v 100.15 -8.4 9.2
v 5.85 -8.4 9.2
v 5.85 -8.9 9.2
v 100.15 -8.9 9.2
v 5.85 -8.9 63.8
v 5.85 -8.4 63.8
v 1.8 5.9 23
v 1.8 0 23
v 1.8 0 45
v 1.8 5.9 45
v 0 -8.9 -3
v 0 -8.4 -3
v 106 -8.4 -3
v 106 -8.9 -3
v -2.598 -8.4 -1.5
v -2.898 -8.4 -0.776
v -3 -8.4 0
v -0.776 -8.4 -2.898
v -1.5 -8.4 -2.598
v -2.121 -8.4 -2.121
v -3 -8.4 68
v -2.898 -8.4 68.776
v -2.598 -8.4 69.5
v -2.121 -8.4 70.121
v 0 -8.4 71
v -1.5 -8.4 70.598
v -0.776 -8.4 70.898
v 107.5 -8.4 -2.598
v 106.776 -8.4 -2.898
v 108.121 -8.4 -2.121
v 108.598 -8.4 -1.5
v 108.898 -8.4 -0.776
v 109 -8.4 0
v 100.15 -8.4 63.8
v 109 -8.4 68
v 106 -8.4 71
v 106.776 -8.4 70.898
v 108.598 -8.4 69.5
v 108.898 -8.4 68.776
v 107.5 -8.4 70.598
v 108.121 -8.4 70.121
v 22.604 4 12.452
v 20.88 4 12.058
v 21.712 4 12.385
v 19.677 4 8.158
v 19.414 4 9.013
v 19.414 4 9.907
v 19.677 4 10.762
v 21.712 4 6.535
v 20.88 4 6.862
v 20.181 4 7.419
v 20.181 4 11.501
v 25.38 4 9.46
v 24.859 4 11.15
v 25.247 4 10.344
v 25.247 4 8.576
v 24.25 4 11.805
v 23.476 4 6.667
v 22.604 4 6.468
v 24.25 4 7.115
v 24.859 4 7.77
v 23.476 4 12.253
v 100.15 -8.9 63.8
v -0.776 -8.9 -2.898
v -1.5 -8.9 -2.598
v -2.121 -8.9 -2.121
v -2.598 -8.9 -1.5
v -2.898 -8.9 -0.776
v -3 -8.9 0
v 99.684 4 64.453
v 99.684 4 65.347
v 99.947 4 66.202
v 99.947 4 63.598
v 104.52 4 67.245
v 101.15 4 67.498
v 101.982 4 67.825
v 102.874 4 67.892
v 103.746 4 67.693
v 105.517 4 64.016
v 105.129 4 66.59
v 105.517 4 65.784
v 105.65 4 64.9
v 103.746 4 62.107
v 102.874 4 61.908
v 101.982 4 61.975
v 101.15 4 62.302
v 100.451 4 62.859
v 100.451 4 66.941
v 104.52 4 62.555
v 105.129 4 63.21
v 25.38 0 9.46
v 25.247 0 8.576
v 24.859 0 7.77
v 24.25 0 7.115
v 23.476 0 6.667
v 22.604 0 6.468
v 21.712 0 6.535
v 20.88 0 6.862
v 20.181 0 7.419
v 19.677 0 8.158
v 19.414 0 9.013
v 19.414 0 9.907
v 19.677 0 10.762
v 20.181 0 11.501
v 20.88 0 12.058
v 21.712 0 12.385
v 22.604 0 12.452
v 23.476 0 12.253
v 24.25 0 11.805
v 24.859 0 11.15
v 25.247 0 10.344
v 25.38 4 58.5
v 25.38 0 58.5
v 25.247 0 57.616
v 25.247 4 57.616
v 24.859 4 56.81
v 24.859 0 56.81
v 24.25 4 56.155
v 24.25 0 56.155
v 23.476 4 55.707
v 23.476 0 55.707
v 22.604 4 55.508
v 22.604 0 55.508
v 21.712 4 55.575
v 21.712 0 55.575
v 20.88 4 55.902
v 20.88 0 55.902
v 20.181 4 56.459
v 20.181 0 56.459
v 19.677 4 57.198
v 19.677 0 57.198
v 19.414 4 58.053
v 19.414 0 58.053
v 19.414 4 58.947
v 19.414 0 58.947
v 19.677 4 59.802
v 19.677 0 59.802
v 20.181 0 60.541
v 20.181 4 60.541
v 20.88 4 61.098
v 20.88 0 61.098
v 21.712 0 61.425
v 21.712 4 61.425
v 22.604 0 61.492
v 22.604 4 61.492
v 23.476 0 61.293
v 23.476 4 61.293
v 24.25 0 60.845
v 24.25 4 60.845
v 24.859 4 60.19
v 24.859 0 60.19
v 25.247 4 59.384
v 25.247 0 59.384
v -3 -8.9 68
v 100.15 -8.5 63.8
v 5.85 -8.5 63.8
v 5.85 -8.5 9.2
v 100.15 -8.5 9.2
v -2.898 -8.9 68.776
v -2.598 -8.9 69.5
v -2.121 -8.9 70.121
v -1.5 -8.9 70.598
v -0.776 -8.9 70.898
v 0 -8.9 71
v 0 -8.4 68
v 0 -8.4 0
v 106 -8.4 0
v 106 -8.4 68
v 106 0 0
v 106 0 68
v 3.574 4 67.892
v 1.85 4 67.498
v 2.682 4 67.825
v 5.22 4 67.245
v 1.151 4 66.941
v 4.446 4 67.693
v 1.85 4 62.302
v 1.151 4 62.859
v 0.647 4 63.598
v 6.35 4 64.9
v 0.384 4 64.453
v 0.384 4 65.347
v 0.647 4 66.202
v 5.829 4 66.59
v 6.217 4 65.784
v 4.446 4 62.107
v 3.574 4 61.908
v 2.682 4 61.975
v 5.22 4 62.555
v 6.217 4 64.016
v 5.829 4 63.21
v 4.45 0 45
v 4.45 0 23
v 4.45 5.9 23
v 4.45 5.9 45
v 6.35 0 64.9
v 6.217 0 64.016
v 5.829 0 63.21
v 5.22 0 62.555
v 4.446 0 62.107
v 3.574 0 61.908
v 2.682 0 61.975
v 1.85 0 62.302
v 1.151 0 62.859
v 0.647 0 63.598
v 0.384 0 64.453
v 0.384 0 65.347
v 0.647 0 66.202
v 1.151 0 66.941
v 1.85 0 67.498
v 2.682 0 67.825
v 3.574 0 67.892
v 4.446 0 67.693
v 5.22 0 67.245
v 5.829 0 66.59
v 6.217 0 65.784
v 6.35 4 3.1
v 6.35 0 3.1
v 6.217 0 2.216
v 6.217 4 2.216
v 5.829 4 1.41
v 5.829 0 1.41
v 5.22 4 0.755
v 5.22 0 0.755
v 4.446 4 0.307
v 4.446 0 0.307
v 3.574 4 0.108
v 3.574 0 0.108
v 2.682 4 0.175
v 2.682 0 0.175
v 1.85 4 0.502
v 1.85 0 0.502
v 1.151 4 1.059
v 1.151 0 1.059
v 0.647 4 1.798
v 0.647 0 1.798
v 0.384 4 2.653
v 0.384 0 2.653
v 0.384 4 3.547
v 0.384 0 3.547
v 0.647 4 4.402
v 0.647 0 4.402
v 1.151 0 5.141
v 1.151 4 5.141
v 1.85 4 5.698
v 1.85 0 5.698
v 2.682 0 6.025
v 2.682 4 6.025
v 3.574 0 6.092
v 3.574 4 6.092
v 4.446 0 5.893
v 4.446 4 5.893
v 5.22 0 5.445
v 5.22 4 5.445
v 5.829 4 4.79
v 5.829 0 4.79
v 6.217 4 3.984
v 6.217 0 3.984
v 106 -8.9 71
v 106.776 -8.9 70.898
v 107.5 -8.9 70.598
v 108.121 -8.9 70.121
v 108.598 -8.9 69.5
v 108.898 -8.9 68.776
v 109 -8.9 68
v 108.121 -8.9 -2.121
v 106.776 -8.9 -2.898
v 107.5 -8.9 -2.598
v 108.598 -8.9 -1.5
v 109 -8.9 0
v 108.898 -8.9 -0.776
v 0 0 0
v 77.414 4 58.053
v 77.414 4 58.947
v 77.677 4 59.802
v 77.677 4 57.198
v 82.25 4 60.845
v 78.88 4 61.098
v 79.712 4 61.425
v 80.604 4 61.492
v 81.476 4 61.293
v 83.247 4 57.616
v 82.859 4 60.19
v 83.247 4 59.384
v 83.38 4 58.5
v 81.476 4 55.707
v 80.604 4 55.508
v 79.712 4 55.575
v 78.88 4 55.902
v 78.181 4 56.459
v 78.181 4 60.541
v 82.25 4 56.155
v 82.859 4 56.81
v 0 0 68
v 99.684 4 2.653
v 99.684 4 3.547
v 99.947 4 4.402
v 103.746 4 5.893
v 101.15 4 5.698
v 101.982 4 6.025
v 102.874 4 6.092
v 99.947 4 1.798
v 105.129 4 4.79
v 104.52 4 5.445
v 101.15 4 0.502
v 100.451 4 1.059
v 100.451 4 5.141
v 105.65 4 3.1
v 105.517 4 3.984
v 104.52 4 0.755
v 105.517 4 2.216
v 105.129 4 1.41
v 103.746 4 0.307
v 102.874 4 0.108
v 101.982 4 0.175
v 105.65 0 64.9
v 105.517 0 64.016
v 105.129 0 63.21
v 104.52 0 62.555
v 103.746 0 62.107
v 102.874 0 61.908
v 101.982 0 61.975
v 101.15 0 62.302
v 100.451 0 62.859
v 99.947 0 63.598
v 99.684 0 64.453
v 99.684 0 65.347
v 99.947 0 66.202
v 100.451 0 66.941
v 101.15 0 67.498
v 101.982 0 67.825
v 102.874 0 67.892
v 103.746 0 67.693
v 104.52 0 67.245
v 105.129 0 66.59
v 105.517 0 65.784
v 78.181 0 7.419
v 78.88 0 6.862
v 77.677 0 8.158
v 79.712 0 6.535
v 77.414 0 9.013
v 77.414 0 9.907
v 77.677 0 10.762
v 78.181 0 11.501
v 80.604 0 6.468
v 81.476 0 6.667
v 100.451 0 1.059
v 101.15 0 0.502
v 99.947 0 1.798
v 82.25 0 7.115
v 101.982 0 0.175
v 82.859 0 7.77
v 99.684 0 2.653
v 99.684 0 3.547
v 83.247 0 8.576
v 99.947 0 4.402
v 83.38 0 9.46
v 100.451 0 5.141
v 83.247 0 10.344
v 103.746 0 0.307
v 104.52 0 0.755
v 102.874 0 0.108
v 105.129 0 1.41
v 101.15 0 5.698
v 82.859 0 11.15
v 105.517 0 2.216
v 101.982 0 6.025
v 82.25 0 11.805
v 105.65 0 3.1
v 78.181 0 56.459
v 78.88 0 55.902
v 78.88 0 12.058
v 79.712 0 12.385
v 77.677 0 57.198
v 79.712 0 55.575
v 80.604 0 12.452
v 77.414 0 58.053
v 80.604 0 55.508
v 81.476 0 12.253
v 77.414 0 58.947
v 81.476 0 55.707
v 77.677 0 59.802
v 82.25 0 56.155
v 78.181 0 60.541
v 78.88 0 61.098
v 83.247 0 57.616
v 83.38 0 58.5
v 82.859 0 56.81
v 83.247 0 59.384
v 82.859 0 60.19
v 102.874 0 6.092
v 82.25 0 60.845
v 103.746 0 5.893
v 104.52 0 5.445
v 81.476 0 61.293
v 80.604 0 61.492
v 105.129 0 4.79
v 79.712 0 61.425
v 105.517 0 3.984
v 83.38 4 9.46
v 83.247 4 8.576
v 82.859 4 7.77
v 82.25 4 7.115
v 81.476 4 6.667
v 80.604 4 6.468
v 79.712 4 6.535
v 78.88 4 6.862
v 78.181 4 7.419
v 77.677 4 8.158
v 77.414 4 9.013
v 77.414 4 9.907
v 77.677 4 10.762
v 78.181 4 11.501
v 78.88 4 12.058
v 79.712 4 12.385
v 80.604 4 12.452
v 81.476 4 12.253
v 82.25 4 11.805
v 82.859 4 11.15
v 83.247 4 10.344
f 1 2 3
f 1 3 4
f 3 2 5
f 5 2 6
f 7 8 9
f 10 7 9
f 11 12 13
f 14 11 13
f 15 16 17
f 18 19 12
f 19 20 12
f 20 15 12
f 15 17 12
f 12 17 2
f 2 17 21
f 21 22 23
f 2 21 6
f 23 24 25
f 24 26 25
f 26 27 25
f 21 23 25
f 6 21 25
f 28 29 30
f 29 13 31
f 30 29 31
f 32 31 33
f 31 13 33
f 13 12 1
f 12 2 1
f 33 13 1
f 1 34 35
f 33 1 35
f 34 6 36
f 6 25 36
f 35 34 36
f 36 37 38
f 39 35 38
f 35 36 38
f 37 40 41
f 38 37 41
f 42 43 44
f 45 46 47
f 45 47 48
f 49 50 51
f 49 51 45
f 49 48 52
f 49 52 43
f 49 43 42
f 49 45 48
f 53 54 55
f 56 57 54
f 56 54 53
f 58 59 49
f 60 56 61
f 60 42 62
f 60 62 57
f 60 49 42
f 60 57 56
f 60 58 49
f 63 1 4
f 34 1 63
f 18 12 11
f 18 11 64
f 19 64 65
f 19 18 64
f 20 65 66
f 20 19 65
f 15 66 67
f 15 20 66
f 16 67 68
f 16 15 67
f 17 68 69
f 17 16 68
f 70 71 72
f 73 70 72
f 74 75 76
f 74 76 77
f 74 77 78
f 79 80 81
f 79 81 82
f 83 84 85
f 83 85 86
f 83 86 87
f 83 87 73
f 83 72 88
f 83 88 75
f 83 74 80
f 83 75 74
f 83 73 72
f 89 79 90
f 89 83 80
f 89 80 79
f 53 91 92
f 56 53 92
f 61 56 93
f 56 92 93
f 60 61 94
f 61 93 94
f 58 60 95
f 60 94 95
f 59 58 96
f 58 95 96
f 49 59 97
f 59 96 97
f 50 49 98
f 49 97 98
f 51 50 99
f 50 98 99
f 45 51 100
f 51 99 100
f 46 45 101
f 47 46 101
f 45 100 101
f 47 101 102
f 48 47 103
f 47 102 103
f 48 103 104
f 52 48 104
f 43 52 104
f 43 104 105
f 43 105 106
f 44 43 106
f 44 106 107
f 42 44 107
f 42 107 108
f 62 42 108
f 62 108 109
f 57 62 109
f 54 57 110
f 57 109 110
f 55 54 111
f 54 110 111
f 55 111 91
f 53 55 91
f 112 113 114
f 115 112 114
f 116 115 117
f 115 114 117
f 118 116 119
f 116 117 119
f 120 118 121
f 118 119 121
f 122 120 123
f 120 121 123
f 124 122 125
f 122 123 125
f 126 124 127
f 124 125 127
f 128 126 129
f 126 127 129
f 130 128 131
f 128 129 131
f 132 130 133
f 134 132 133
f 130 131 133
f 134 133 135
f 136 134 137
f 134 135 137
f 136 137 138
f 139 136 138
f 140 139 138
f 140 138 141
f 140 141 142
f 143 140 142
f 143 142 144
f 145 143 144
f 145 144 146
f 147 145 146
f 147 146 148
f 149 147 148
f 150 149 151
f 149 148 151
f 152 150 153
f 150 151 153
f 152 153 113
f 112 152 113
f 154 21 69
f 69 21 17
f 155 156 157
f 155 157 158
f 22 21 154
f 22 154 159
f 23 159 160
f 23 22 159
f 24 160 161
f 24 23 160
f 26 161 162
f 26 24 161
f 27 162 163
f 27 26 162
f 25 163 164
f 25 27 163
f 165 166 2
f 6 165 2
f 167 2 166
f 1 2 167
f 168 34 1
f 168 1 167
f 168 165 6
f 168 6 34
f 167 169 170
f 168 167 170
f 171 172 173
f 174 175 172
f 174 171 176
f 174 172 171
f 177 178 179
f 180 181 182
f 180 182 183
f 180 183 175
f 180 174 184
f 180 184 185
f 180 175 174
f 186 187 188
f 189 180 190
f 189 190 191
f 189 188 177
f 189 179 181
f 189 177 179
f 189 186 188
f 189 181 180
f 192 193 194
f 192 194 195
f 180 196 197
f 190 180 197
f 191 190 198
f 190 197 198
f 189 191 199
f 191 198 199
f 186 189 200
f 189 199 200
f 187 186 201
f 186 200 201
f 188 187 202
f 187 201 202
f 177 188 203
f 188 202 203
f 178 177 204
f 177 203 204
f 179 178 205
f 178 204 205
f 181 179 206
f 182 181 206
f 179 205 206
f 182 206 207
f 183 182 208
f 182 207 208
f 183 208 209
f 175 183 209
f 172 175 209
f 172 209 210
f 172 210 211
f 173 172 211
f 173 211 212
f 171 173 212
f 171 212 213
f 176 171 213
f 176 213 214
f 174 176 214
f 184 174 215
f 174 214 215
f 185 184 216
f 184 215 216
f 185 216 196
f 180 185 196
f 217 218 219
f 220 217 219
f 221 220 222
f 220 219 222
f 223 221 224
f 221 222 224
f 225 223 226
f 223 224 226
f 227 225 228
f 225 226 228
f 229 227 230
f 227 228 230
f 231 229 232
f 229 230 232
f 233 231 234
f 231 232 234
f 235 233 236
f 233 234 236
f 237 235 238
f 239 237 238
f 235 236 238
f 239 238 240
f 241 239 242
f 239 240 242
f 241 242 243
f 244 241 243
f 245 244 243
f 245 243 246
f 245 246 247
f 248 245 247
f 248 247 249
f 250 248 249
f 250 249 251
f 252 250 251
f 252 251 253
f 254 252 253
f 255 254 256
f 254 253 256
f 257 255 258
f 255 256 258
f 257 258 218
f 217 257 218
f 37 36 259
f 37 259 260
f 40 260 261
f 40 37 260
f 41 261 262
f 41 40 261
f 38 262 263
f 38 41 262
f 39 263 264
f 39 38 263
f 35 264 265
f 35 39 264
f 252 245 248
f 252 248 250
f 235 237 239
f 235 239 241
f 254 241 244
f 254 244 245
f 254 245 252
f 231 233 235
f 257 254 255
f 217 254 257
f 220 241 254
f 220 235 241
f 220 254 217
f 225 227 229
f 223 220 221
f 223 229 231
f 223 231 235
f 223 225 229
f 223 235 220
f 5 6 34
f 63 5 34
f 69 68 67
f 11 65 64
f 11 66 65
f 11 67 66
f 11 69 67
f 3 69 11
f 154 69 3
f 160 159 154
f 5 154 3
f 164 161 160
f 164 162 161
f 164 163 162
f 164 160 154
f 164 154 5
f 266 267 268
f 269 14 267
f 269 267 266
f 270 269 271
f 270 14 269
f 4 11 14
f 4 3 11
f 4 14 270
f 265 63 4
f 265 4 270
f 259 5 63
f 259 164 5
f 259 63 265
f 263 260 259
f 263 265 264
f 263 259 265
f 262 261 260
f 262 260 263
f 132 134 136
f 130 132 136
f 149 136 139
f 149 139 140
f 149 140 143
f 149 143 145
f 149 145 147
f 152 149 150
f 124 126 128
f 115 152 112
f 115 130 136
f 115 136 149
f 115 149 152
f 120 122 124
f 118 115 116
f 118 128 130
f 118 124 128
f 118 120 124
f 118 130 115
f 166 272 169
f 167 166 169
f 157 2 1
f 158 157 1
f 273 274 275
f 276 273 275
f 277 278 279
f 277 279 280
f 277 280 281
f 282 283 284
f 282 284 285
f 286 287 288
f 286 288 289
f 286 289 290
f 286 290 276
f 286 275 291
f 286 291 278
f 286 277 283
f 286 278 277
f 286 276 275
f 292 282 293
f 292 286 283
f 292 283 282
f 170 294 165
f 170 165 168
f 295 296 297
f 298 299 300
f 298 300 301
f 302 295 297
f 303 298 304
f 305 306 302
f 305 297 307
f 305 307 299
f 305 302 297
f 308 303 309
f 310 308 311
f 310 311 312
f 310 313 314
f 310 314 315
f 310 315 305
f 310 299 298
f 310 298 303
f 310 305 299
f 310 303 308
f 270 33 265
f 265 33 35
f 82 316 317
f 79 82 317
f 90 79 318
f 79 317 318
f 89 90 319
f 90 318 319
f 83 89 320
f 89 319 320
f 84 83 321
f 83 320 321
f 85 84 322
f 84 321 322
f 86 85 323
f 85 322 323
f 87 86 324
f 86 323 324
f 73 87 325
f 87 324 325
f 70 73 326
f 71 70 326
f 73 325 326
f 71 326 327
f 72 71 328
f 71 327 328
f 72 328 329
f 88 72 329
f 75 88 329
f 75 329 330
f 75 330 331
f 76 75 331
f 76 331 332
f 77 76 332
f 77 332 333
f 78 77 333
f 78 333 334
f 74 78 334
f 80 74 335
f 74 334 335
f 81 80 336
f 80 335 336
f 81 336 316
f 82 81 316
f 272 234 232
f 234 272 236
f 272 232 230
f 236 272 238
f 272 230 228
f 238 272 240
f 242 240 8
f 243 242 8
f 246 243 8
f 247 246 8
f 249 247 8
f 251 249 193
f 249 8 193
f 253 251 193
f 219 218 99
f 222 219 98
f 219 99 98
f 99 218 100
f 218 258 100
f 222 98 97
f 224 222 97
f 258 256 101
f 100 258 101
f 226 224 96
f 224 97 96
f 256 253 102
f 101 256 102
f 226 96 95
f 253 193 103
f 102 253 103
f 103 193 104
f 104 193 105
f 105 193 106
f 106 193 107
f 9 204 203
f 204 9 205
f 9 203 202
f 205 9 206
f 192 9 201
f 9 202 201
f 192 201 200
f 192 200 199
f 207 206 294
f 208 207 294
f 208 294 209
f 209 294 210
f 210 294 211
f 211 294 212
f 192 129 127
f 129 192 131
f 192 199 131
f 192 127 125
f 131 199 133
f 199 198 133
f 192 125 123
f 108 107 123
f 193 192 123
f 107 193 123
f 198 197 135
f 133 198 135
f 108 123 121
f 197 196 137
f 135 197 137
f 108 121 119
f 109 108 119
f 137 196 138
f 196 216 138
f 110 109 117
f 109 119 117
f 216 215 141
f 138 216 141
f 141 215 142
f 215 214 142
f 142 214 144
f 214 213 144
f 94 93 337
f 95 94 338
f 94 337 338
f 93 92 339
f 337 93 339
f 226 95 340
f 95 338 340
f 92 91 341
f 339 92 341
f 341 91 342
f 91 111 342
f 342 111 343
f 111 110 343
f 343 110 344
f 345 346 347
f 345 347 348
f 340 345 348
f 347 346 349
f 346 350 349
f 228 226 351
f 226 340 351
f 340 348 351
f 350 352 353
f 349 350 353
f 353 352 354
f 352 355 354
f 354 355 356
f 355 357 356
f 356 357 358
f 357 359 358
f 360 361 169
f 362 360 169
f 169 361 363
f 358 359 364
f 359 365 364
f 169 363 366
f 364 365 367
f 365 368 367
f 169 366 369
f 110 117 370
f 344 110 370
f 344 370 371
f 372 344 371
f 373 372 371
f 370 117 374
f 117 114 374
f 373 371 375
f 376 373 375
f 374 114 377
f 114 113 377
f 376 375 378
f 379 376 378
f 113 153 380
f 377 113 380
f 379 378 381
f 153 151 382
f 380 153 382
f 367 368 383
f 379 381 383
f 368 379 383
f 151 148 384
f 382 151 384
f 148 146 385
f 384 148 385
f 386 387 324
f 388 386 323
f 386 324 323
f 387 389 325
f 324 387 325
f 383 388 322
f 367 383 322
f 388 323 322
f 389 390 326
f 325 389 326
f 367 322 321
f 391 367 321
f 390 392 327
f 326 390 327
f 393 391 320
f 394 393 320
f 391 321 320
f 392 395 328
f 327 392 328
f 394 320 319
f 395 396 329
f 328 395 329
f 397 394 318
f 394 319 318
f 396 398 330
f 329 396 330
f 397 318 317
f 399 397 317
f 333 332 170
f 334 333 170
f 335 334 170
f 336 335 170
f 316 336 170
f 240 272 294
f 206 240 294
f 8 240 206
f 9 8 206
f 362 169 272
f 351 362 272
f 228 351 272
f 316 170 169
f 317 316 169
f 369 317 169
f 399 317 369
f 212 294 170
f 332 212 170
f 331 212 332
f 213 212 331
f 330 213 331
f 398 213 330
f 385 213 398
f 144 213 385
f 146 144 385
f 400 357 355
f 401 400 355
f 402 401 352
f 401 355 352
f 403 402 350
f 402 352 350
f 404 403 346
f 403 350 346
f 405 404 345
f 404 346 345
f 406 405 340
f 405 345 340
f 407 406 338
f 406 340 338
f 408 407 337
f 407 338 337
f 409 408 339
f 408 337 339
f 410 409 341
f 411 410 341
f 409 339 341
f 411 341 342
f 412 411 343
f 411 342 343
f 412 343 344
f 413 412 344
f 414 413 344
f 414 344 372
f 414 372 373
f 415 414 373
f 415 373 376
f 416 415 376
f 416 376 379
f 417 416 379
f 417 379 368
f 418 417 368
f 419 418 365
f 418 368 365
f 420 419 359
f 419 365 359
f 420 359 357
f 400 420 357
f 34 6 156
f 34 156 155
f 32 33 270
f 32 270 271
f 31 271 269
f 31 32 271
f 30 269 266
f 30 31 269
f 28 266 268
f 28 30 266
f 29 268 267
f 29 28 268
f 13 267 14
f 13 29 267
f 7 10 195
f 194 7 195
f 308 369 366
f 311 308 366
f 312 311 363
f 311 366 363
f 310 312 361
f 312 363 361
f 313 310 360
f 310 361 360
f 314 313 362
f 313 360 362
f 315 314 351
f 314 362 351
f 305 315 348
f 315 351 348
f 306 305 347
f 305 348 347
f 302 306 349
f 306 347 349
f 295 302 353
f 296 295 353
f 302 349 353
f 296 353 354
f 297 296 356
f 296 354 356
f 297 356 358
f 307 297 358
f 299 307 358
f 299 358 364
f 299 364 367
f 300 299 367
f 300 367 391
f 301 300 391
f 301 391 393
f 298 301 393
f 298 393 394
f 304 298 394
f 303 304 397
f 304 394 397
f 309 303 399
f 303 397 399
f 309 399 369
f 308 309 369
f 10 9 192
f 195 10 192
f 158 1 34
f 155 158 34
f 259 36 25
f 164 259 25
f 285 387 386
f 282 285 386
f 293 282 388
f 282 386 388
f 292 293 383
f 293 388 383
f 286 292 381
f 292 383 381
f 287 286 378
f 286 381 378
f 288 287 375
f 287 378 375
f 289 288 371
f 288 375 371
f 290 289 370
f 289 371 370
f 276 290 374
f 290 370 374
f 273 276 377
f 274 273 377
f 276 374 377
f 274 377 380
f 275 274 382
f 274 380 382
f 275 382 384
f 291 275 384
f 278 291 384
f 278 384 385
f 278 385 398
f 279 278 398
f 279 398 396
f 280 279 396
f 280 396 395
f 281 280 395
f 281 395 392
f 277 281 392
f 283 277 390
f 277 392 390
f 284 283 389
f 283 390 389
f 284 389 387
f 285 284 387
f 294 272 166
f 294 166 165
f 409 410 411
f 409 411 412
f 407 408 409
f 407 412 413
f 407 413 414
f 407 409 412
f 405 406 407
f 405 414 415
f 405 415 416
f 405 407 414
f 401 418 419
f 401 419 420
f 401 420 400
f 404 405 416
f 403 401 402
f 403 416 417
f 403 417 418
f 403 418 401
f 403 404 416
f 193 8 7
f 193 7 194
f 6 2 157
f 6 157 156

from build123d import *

# Parameters (mm, degrees)
SKETCH_W     = 106
SKETCH_H     = 68
PAD_DEPTH    = 8.4
SKETCH001_R  = 3
PAD001_DEPTH = 4
SKETCH002_W  = 2.65
SKETCH002_H  = 22
PAD002_DEPTH = 5.9
SKETCH003_W  = 94.3
SKETCH003_H  = 54.6
PAD003_DEPTH = 0.1
SKETCH005_W  = 94.3
SKETCH005_H  = 54.6
PAD004_DEPTH = 0.5


with BuildPart() as lcd:
    # Sketch → Pad (new body)
    with BuildSketch(Plane.XZ):
        with Locations((53, 34)):
            Rectangle(SKETCH_W, SKETCH_H)
    extrude(amount=PAD_DEPTH)

    # Sketch001 (on Face5 of Pad) → Pad001 (join)
    with BuildSketch(Plane(origin=(0, 0, 0), x_dir=(1, 0, 0), z_dir=(0, 1, 0))):
        with Locations((3.35, -64.9)):
            Circle(SKETCH001_R)
        with Locations((102.65, -64.9)):
            Circle(SKETCH001_R)
        with Locations((102.65, -3.1)):
            Circle(SKETCH001_R)
        with Locations((3.35, -3.1)):
            Circle(SKETCH001_R)
        with Locations((80.38, -9.46)):
            Circle(SKETCH001_R)
        with Locations((80.38, -58.5)):
            Circle(SKETCH001_R)
        with Locations((22.38, -9.46)):
            Circle(SKETCH001_R)
        with Locations((22.38, -58.5)):
            Circle(SKETCH001_R)
    extrude(amount=PAD001_DEPTH)

    # Sketch002 → Pad002 (join)
    with BuildSketch(Plane.XZ):
        with Locations((3.125, 34)):
            Rectangle(SKETCH002_W, SKETCH002_H)
    extrude(amount=-PAD002_DEPTH)

    # Sketch003 (on Face5 of Pad002) → Pad003 (join)
    with BuildSketch(Plane.XZ.offset(8.4)):
        with Locations((53, 36.5)):
            Rectangle(SKETCH003_W, SKETCH003_H)
    extrude(amount=PAD003_DEPTH)


with BuildPart() as body:
    # Sketch005 (on Face1 of CopyBinder) → Pad004 (new body)
    with BuildSketch(Plane.XZ.offset(8.4)):
        with BuildLine():
            Line((-3, 68), (-3, 0))
            ThreePointArc((0, -3), (-2.12132, -2.12132), (-3, 0))
            Line((0, -3), (106, -3))
            ThreePointArc((109, 0), (108.12132, -2.12132), (106, -3))
            Line((109, 0), (109, 68))
            ThreePointArc((106, 71), (108.12132, 70.12132), (109, 68))
            Line((106, 71), (0, 71))
            ThreePointArc((-3, 68), (-2.12132, 70.12132), (0, 71))
        make_face()
        with Locations((53, 36.5)):
            Rectangle(SKETCH005_W, SKETCH005_H, mode=Mode.SUBTRACT)
    extrude(amount=PAD004_DEPTH)


solid = Compound([lcd.part, body.part])
